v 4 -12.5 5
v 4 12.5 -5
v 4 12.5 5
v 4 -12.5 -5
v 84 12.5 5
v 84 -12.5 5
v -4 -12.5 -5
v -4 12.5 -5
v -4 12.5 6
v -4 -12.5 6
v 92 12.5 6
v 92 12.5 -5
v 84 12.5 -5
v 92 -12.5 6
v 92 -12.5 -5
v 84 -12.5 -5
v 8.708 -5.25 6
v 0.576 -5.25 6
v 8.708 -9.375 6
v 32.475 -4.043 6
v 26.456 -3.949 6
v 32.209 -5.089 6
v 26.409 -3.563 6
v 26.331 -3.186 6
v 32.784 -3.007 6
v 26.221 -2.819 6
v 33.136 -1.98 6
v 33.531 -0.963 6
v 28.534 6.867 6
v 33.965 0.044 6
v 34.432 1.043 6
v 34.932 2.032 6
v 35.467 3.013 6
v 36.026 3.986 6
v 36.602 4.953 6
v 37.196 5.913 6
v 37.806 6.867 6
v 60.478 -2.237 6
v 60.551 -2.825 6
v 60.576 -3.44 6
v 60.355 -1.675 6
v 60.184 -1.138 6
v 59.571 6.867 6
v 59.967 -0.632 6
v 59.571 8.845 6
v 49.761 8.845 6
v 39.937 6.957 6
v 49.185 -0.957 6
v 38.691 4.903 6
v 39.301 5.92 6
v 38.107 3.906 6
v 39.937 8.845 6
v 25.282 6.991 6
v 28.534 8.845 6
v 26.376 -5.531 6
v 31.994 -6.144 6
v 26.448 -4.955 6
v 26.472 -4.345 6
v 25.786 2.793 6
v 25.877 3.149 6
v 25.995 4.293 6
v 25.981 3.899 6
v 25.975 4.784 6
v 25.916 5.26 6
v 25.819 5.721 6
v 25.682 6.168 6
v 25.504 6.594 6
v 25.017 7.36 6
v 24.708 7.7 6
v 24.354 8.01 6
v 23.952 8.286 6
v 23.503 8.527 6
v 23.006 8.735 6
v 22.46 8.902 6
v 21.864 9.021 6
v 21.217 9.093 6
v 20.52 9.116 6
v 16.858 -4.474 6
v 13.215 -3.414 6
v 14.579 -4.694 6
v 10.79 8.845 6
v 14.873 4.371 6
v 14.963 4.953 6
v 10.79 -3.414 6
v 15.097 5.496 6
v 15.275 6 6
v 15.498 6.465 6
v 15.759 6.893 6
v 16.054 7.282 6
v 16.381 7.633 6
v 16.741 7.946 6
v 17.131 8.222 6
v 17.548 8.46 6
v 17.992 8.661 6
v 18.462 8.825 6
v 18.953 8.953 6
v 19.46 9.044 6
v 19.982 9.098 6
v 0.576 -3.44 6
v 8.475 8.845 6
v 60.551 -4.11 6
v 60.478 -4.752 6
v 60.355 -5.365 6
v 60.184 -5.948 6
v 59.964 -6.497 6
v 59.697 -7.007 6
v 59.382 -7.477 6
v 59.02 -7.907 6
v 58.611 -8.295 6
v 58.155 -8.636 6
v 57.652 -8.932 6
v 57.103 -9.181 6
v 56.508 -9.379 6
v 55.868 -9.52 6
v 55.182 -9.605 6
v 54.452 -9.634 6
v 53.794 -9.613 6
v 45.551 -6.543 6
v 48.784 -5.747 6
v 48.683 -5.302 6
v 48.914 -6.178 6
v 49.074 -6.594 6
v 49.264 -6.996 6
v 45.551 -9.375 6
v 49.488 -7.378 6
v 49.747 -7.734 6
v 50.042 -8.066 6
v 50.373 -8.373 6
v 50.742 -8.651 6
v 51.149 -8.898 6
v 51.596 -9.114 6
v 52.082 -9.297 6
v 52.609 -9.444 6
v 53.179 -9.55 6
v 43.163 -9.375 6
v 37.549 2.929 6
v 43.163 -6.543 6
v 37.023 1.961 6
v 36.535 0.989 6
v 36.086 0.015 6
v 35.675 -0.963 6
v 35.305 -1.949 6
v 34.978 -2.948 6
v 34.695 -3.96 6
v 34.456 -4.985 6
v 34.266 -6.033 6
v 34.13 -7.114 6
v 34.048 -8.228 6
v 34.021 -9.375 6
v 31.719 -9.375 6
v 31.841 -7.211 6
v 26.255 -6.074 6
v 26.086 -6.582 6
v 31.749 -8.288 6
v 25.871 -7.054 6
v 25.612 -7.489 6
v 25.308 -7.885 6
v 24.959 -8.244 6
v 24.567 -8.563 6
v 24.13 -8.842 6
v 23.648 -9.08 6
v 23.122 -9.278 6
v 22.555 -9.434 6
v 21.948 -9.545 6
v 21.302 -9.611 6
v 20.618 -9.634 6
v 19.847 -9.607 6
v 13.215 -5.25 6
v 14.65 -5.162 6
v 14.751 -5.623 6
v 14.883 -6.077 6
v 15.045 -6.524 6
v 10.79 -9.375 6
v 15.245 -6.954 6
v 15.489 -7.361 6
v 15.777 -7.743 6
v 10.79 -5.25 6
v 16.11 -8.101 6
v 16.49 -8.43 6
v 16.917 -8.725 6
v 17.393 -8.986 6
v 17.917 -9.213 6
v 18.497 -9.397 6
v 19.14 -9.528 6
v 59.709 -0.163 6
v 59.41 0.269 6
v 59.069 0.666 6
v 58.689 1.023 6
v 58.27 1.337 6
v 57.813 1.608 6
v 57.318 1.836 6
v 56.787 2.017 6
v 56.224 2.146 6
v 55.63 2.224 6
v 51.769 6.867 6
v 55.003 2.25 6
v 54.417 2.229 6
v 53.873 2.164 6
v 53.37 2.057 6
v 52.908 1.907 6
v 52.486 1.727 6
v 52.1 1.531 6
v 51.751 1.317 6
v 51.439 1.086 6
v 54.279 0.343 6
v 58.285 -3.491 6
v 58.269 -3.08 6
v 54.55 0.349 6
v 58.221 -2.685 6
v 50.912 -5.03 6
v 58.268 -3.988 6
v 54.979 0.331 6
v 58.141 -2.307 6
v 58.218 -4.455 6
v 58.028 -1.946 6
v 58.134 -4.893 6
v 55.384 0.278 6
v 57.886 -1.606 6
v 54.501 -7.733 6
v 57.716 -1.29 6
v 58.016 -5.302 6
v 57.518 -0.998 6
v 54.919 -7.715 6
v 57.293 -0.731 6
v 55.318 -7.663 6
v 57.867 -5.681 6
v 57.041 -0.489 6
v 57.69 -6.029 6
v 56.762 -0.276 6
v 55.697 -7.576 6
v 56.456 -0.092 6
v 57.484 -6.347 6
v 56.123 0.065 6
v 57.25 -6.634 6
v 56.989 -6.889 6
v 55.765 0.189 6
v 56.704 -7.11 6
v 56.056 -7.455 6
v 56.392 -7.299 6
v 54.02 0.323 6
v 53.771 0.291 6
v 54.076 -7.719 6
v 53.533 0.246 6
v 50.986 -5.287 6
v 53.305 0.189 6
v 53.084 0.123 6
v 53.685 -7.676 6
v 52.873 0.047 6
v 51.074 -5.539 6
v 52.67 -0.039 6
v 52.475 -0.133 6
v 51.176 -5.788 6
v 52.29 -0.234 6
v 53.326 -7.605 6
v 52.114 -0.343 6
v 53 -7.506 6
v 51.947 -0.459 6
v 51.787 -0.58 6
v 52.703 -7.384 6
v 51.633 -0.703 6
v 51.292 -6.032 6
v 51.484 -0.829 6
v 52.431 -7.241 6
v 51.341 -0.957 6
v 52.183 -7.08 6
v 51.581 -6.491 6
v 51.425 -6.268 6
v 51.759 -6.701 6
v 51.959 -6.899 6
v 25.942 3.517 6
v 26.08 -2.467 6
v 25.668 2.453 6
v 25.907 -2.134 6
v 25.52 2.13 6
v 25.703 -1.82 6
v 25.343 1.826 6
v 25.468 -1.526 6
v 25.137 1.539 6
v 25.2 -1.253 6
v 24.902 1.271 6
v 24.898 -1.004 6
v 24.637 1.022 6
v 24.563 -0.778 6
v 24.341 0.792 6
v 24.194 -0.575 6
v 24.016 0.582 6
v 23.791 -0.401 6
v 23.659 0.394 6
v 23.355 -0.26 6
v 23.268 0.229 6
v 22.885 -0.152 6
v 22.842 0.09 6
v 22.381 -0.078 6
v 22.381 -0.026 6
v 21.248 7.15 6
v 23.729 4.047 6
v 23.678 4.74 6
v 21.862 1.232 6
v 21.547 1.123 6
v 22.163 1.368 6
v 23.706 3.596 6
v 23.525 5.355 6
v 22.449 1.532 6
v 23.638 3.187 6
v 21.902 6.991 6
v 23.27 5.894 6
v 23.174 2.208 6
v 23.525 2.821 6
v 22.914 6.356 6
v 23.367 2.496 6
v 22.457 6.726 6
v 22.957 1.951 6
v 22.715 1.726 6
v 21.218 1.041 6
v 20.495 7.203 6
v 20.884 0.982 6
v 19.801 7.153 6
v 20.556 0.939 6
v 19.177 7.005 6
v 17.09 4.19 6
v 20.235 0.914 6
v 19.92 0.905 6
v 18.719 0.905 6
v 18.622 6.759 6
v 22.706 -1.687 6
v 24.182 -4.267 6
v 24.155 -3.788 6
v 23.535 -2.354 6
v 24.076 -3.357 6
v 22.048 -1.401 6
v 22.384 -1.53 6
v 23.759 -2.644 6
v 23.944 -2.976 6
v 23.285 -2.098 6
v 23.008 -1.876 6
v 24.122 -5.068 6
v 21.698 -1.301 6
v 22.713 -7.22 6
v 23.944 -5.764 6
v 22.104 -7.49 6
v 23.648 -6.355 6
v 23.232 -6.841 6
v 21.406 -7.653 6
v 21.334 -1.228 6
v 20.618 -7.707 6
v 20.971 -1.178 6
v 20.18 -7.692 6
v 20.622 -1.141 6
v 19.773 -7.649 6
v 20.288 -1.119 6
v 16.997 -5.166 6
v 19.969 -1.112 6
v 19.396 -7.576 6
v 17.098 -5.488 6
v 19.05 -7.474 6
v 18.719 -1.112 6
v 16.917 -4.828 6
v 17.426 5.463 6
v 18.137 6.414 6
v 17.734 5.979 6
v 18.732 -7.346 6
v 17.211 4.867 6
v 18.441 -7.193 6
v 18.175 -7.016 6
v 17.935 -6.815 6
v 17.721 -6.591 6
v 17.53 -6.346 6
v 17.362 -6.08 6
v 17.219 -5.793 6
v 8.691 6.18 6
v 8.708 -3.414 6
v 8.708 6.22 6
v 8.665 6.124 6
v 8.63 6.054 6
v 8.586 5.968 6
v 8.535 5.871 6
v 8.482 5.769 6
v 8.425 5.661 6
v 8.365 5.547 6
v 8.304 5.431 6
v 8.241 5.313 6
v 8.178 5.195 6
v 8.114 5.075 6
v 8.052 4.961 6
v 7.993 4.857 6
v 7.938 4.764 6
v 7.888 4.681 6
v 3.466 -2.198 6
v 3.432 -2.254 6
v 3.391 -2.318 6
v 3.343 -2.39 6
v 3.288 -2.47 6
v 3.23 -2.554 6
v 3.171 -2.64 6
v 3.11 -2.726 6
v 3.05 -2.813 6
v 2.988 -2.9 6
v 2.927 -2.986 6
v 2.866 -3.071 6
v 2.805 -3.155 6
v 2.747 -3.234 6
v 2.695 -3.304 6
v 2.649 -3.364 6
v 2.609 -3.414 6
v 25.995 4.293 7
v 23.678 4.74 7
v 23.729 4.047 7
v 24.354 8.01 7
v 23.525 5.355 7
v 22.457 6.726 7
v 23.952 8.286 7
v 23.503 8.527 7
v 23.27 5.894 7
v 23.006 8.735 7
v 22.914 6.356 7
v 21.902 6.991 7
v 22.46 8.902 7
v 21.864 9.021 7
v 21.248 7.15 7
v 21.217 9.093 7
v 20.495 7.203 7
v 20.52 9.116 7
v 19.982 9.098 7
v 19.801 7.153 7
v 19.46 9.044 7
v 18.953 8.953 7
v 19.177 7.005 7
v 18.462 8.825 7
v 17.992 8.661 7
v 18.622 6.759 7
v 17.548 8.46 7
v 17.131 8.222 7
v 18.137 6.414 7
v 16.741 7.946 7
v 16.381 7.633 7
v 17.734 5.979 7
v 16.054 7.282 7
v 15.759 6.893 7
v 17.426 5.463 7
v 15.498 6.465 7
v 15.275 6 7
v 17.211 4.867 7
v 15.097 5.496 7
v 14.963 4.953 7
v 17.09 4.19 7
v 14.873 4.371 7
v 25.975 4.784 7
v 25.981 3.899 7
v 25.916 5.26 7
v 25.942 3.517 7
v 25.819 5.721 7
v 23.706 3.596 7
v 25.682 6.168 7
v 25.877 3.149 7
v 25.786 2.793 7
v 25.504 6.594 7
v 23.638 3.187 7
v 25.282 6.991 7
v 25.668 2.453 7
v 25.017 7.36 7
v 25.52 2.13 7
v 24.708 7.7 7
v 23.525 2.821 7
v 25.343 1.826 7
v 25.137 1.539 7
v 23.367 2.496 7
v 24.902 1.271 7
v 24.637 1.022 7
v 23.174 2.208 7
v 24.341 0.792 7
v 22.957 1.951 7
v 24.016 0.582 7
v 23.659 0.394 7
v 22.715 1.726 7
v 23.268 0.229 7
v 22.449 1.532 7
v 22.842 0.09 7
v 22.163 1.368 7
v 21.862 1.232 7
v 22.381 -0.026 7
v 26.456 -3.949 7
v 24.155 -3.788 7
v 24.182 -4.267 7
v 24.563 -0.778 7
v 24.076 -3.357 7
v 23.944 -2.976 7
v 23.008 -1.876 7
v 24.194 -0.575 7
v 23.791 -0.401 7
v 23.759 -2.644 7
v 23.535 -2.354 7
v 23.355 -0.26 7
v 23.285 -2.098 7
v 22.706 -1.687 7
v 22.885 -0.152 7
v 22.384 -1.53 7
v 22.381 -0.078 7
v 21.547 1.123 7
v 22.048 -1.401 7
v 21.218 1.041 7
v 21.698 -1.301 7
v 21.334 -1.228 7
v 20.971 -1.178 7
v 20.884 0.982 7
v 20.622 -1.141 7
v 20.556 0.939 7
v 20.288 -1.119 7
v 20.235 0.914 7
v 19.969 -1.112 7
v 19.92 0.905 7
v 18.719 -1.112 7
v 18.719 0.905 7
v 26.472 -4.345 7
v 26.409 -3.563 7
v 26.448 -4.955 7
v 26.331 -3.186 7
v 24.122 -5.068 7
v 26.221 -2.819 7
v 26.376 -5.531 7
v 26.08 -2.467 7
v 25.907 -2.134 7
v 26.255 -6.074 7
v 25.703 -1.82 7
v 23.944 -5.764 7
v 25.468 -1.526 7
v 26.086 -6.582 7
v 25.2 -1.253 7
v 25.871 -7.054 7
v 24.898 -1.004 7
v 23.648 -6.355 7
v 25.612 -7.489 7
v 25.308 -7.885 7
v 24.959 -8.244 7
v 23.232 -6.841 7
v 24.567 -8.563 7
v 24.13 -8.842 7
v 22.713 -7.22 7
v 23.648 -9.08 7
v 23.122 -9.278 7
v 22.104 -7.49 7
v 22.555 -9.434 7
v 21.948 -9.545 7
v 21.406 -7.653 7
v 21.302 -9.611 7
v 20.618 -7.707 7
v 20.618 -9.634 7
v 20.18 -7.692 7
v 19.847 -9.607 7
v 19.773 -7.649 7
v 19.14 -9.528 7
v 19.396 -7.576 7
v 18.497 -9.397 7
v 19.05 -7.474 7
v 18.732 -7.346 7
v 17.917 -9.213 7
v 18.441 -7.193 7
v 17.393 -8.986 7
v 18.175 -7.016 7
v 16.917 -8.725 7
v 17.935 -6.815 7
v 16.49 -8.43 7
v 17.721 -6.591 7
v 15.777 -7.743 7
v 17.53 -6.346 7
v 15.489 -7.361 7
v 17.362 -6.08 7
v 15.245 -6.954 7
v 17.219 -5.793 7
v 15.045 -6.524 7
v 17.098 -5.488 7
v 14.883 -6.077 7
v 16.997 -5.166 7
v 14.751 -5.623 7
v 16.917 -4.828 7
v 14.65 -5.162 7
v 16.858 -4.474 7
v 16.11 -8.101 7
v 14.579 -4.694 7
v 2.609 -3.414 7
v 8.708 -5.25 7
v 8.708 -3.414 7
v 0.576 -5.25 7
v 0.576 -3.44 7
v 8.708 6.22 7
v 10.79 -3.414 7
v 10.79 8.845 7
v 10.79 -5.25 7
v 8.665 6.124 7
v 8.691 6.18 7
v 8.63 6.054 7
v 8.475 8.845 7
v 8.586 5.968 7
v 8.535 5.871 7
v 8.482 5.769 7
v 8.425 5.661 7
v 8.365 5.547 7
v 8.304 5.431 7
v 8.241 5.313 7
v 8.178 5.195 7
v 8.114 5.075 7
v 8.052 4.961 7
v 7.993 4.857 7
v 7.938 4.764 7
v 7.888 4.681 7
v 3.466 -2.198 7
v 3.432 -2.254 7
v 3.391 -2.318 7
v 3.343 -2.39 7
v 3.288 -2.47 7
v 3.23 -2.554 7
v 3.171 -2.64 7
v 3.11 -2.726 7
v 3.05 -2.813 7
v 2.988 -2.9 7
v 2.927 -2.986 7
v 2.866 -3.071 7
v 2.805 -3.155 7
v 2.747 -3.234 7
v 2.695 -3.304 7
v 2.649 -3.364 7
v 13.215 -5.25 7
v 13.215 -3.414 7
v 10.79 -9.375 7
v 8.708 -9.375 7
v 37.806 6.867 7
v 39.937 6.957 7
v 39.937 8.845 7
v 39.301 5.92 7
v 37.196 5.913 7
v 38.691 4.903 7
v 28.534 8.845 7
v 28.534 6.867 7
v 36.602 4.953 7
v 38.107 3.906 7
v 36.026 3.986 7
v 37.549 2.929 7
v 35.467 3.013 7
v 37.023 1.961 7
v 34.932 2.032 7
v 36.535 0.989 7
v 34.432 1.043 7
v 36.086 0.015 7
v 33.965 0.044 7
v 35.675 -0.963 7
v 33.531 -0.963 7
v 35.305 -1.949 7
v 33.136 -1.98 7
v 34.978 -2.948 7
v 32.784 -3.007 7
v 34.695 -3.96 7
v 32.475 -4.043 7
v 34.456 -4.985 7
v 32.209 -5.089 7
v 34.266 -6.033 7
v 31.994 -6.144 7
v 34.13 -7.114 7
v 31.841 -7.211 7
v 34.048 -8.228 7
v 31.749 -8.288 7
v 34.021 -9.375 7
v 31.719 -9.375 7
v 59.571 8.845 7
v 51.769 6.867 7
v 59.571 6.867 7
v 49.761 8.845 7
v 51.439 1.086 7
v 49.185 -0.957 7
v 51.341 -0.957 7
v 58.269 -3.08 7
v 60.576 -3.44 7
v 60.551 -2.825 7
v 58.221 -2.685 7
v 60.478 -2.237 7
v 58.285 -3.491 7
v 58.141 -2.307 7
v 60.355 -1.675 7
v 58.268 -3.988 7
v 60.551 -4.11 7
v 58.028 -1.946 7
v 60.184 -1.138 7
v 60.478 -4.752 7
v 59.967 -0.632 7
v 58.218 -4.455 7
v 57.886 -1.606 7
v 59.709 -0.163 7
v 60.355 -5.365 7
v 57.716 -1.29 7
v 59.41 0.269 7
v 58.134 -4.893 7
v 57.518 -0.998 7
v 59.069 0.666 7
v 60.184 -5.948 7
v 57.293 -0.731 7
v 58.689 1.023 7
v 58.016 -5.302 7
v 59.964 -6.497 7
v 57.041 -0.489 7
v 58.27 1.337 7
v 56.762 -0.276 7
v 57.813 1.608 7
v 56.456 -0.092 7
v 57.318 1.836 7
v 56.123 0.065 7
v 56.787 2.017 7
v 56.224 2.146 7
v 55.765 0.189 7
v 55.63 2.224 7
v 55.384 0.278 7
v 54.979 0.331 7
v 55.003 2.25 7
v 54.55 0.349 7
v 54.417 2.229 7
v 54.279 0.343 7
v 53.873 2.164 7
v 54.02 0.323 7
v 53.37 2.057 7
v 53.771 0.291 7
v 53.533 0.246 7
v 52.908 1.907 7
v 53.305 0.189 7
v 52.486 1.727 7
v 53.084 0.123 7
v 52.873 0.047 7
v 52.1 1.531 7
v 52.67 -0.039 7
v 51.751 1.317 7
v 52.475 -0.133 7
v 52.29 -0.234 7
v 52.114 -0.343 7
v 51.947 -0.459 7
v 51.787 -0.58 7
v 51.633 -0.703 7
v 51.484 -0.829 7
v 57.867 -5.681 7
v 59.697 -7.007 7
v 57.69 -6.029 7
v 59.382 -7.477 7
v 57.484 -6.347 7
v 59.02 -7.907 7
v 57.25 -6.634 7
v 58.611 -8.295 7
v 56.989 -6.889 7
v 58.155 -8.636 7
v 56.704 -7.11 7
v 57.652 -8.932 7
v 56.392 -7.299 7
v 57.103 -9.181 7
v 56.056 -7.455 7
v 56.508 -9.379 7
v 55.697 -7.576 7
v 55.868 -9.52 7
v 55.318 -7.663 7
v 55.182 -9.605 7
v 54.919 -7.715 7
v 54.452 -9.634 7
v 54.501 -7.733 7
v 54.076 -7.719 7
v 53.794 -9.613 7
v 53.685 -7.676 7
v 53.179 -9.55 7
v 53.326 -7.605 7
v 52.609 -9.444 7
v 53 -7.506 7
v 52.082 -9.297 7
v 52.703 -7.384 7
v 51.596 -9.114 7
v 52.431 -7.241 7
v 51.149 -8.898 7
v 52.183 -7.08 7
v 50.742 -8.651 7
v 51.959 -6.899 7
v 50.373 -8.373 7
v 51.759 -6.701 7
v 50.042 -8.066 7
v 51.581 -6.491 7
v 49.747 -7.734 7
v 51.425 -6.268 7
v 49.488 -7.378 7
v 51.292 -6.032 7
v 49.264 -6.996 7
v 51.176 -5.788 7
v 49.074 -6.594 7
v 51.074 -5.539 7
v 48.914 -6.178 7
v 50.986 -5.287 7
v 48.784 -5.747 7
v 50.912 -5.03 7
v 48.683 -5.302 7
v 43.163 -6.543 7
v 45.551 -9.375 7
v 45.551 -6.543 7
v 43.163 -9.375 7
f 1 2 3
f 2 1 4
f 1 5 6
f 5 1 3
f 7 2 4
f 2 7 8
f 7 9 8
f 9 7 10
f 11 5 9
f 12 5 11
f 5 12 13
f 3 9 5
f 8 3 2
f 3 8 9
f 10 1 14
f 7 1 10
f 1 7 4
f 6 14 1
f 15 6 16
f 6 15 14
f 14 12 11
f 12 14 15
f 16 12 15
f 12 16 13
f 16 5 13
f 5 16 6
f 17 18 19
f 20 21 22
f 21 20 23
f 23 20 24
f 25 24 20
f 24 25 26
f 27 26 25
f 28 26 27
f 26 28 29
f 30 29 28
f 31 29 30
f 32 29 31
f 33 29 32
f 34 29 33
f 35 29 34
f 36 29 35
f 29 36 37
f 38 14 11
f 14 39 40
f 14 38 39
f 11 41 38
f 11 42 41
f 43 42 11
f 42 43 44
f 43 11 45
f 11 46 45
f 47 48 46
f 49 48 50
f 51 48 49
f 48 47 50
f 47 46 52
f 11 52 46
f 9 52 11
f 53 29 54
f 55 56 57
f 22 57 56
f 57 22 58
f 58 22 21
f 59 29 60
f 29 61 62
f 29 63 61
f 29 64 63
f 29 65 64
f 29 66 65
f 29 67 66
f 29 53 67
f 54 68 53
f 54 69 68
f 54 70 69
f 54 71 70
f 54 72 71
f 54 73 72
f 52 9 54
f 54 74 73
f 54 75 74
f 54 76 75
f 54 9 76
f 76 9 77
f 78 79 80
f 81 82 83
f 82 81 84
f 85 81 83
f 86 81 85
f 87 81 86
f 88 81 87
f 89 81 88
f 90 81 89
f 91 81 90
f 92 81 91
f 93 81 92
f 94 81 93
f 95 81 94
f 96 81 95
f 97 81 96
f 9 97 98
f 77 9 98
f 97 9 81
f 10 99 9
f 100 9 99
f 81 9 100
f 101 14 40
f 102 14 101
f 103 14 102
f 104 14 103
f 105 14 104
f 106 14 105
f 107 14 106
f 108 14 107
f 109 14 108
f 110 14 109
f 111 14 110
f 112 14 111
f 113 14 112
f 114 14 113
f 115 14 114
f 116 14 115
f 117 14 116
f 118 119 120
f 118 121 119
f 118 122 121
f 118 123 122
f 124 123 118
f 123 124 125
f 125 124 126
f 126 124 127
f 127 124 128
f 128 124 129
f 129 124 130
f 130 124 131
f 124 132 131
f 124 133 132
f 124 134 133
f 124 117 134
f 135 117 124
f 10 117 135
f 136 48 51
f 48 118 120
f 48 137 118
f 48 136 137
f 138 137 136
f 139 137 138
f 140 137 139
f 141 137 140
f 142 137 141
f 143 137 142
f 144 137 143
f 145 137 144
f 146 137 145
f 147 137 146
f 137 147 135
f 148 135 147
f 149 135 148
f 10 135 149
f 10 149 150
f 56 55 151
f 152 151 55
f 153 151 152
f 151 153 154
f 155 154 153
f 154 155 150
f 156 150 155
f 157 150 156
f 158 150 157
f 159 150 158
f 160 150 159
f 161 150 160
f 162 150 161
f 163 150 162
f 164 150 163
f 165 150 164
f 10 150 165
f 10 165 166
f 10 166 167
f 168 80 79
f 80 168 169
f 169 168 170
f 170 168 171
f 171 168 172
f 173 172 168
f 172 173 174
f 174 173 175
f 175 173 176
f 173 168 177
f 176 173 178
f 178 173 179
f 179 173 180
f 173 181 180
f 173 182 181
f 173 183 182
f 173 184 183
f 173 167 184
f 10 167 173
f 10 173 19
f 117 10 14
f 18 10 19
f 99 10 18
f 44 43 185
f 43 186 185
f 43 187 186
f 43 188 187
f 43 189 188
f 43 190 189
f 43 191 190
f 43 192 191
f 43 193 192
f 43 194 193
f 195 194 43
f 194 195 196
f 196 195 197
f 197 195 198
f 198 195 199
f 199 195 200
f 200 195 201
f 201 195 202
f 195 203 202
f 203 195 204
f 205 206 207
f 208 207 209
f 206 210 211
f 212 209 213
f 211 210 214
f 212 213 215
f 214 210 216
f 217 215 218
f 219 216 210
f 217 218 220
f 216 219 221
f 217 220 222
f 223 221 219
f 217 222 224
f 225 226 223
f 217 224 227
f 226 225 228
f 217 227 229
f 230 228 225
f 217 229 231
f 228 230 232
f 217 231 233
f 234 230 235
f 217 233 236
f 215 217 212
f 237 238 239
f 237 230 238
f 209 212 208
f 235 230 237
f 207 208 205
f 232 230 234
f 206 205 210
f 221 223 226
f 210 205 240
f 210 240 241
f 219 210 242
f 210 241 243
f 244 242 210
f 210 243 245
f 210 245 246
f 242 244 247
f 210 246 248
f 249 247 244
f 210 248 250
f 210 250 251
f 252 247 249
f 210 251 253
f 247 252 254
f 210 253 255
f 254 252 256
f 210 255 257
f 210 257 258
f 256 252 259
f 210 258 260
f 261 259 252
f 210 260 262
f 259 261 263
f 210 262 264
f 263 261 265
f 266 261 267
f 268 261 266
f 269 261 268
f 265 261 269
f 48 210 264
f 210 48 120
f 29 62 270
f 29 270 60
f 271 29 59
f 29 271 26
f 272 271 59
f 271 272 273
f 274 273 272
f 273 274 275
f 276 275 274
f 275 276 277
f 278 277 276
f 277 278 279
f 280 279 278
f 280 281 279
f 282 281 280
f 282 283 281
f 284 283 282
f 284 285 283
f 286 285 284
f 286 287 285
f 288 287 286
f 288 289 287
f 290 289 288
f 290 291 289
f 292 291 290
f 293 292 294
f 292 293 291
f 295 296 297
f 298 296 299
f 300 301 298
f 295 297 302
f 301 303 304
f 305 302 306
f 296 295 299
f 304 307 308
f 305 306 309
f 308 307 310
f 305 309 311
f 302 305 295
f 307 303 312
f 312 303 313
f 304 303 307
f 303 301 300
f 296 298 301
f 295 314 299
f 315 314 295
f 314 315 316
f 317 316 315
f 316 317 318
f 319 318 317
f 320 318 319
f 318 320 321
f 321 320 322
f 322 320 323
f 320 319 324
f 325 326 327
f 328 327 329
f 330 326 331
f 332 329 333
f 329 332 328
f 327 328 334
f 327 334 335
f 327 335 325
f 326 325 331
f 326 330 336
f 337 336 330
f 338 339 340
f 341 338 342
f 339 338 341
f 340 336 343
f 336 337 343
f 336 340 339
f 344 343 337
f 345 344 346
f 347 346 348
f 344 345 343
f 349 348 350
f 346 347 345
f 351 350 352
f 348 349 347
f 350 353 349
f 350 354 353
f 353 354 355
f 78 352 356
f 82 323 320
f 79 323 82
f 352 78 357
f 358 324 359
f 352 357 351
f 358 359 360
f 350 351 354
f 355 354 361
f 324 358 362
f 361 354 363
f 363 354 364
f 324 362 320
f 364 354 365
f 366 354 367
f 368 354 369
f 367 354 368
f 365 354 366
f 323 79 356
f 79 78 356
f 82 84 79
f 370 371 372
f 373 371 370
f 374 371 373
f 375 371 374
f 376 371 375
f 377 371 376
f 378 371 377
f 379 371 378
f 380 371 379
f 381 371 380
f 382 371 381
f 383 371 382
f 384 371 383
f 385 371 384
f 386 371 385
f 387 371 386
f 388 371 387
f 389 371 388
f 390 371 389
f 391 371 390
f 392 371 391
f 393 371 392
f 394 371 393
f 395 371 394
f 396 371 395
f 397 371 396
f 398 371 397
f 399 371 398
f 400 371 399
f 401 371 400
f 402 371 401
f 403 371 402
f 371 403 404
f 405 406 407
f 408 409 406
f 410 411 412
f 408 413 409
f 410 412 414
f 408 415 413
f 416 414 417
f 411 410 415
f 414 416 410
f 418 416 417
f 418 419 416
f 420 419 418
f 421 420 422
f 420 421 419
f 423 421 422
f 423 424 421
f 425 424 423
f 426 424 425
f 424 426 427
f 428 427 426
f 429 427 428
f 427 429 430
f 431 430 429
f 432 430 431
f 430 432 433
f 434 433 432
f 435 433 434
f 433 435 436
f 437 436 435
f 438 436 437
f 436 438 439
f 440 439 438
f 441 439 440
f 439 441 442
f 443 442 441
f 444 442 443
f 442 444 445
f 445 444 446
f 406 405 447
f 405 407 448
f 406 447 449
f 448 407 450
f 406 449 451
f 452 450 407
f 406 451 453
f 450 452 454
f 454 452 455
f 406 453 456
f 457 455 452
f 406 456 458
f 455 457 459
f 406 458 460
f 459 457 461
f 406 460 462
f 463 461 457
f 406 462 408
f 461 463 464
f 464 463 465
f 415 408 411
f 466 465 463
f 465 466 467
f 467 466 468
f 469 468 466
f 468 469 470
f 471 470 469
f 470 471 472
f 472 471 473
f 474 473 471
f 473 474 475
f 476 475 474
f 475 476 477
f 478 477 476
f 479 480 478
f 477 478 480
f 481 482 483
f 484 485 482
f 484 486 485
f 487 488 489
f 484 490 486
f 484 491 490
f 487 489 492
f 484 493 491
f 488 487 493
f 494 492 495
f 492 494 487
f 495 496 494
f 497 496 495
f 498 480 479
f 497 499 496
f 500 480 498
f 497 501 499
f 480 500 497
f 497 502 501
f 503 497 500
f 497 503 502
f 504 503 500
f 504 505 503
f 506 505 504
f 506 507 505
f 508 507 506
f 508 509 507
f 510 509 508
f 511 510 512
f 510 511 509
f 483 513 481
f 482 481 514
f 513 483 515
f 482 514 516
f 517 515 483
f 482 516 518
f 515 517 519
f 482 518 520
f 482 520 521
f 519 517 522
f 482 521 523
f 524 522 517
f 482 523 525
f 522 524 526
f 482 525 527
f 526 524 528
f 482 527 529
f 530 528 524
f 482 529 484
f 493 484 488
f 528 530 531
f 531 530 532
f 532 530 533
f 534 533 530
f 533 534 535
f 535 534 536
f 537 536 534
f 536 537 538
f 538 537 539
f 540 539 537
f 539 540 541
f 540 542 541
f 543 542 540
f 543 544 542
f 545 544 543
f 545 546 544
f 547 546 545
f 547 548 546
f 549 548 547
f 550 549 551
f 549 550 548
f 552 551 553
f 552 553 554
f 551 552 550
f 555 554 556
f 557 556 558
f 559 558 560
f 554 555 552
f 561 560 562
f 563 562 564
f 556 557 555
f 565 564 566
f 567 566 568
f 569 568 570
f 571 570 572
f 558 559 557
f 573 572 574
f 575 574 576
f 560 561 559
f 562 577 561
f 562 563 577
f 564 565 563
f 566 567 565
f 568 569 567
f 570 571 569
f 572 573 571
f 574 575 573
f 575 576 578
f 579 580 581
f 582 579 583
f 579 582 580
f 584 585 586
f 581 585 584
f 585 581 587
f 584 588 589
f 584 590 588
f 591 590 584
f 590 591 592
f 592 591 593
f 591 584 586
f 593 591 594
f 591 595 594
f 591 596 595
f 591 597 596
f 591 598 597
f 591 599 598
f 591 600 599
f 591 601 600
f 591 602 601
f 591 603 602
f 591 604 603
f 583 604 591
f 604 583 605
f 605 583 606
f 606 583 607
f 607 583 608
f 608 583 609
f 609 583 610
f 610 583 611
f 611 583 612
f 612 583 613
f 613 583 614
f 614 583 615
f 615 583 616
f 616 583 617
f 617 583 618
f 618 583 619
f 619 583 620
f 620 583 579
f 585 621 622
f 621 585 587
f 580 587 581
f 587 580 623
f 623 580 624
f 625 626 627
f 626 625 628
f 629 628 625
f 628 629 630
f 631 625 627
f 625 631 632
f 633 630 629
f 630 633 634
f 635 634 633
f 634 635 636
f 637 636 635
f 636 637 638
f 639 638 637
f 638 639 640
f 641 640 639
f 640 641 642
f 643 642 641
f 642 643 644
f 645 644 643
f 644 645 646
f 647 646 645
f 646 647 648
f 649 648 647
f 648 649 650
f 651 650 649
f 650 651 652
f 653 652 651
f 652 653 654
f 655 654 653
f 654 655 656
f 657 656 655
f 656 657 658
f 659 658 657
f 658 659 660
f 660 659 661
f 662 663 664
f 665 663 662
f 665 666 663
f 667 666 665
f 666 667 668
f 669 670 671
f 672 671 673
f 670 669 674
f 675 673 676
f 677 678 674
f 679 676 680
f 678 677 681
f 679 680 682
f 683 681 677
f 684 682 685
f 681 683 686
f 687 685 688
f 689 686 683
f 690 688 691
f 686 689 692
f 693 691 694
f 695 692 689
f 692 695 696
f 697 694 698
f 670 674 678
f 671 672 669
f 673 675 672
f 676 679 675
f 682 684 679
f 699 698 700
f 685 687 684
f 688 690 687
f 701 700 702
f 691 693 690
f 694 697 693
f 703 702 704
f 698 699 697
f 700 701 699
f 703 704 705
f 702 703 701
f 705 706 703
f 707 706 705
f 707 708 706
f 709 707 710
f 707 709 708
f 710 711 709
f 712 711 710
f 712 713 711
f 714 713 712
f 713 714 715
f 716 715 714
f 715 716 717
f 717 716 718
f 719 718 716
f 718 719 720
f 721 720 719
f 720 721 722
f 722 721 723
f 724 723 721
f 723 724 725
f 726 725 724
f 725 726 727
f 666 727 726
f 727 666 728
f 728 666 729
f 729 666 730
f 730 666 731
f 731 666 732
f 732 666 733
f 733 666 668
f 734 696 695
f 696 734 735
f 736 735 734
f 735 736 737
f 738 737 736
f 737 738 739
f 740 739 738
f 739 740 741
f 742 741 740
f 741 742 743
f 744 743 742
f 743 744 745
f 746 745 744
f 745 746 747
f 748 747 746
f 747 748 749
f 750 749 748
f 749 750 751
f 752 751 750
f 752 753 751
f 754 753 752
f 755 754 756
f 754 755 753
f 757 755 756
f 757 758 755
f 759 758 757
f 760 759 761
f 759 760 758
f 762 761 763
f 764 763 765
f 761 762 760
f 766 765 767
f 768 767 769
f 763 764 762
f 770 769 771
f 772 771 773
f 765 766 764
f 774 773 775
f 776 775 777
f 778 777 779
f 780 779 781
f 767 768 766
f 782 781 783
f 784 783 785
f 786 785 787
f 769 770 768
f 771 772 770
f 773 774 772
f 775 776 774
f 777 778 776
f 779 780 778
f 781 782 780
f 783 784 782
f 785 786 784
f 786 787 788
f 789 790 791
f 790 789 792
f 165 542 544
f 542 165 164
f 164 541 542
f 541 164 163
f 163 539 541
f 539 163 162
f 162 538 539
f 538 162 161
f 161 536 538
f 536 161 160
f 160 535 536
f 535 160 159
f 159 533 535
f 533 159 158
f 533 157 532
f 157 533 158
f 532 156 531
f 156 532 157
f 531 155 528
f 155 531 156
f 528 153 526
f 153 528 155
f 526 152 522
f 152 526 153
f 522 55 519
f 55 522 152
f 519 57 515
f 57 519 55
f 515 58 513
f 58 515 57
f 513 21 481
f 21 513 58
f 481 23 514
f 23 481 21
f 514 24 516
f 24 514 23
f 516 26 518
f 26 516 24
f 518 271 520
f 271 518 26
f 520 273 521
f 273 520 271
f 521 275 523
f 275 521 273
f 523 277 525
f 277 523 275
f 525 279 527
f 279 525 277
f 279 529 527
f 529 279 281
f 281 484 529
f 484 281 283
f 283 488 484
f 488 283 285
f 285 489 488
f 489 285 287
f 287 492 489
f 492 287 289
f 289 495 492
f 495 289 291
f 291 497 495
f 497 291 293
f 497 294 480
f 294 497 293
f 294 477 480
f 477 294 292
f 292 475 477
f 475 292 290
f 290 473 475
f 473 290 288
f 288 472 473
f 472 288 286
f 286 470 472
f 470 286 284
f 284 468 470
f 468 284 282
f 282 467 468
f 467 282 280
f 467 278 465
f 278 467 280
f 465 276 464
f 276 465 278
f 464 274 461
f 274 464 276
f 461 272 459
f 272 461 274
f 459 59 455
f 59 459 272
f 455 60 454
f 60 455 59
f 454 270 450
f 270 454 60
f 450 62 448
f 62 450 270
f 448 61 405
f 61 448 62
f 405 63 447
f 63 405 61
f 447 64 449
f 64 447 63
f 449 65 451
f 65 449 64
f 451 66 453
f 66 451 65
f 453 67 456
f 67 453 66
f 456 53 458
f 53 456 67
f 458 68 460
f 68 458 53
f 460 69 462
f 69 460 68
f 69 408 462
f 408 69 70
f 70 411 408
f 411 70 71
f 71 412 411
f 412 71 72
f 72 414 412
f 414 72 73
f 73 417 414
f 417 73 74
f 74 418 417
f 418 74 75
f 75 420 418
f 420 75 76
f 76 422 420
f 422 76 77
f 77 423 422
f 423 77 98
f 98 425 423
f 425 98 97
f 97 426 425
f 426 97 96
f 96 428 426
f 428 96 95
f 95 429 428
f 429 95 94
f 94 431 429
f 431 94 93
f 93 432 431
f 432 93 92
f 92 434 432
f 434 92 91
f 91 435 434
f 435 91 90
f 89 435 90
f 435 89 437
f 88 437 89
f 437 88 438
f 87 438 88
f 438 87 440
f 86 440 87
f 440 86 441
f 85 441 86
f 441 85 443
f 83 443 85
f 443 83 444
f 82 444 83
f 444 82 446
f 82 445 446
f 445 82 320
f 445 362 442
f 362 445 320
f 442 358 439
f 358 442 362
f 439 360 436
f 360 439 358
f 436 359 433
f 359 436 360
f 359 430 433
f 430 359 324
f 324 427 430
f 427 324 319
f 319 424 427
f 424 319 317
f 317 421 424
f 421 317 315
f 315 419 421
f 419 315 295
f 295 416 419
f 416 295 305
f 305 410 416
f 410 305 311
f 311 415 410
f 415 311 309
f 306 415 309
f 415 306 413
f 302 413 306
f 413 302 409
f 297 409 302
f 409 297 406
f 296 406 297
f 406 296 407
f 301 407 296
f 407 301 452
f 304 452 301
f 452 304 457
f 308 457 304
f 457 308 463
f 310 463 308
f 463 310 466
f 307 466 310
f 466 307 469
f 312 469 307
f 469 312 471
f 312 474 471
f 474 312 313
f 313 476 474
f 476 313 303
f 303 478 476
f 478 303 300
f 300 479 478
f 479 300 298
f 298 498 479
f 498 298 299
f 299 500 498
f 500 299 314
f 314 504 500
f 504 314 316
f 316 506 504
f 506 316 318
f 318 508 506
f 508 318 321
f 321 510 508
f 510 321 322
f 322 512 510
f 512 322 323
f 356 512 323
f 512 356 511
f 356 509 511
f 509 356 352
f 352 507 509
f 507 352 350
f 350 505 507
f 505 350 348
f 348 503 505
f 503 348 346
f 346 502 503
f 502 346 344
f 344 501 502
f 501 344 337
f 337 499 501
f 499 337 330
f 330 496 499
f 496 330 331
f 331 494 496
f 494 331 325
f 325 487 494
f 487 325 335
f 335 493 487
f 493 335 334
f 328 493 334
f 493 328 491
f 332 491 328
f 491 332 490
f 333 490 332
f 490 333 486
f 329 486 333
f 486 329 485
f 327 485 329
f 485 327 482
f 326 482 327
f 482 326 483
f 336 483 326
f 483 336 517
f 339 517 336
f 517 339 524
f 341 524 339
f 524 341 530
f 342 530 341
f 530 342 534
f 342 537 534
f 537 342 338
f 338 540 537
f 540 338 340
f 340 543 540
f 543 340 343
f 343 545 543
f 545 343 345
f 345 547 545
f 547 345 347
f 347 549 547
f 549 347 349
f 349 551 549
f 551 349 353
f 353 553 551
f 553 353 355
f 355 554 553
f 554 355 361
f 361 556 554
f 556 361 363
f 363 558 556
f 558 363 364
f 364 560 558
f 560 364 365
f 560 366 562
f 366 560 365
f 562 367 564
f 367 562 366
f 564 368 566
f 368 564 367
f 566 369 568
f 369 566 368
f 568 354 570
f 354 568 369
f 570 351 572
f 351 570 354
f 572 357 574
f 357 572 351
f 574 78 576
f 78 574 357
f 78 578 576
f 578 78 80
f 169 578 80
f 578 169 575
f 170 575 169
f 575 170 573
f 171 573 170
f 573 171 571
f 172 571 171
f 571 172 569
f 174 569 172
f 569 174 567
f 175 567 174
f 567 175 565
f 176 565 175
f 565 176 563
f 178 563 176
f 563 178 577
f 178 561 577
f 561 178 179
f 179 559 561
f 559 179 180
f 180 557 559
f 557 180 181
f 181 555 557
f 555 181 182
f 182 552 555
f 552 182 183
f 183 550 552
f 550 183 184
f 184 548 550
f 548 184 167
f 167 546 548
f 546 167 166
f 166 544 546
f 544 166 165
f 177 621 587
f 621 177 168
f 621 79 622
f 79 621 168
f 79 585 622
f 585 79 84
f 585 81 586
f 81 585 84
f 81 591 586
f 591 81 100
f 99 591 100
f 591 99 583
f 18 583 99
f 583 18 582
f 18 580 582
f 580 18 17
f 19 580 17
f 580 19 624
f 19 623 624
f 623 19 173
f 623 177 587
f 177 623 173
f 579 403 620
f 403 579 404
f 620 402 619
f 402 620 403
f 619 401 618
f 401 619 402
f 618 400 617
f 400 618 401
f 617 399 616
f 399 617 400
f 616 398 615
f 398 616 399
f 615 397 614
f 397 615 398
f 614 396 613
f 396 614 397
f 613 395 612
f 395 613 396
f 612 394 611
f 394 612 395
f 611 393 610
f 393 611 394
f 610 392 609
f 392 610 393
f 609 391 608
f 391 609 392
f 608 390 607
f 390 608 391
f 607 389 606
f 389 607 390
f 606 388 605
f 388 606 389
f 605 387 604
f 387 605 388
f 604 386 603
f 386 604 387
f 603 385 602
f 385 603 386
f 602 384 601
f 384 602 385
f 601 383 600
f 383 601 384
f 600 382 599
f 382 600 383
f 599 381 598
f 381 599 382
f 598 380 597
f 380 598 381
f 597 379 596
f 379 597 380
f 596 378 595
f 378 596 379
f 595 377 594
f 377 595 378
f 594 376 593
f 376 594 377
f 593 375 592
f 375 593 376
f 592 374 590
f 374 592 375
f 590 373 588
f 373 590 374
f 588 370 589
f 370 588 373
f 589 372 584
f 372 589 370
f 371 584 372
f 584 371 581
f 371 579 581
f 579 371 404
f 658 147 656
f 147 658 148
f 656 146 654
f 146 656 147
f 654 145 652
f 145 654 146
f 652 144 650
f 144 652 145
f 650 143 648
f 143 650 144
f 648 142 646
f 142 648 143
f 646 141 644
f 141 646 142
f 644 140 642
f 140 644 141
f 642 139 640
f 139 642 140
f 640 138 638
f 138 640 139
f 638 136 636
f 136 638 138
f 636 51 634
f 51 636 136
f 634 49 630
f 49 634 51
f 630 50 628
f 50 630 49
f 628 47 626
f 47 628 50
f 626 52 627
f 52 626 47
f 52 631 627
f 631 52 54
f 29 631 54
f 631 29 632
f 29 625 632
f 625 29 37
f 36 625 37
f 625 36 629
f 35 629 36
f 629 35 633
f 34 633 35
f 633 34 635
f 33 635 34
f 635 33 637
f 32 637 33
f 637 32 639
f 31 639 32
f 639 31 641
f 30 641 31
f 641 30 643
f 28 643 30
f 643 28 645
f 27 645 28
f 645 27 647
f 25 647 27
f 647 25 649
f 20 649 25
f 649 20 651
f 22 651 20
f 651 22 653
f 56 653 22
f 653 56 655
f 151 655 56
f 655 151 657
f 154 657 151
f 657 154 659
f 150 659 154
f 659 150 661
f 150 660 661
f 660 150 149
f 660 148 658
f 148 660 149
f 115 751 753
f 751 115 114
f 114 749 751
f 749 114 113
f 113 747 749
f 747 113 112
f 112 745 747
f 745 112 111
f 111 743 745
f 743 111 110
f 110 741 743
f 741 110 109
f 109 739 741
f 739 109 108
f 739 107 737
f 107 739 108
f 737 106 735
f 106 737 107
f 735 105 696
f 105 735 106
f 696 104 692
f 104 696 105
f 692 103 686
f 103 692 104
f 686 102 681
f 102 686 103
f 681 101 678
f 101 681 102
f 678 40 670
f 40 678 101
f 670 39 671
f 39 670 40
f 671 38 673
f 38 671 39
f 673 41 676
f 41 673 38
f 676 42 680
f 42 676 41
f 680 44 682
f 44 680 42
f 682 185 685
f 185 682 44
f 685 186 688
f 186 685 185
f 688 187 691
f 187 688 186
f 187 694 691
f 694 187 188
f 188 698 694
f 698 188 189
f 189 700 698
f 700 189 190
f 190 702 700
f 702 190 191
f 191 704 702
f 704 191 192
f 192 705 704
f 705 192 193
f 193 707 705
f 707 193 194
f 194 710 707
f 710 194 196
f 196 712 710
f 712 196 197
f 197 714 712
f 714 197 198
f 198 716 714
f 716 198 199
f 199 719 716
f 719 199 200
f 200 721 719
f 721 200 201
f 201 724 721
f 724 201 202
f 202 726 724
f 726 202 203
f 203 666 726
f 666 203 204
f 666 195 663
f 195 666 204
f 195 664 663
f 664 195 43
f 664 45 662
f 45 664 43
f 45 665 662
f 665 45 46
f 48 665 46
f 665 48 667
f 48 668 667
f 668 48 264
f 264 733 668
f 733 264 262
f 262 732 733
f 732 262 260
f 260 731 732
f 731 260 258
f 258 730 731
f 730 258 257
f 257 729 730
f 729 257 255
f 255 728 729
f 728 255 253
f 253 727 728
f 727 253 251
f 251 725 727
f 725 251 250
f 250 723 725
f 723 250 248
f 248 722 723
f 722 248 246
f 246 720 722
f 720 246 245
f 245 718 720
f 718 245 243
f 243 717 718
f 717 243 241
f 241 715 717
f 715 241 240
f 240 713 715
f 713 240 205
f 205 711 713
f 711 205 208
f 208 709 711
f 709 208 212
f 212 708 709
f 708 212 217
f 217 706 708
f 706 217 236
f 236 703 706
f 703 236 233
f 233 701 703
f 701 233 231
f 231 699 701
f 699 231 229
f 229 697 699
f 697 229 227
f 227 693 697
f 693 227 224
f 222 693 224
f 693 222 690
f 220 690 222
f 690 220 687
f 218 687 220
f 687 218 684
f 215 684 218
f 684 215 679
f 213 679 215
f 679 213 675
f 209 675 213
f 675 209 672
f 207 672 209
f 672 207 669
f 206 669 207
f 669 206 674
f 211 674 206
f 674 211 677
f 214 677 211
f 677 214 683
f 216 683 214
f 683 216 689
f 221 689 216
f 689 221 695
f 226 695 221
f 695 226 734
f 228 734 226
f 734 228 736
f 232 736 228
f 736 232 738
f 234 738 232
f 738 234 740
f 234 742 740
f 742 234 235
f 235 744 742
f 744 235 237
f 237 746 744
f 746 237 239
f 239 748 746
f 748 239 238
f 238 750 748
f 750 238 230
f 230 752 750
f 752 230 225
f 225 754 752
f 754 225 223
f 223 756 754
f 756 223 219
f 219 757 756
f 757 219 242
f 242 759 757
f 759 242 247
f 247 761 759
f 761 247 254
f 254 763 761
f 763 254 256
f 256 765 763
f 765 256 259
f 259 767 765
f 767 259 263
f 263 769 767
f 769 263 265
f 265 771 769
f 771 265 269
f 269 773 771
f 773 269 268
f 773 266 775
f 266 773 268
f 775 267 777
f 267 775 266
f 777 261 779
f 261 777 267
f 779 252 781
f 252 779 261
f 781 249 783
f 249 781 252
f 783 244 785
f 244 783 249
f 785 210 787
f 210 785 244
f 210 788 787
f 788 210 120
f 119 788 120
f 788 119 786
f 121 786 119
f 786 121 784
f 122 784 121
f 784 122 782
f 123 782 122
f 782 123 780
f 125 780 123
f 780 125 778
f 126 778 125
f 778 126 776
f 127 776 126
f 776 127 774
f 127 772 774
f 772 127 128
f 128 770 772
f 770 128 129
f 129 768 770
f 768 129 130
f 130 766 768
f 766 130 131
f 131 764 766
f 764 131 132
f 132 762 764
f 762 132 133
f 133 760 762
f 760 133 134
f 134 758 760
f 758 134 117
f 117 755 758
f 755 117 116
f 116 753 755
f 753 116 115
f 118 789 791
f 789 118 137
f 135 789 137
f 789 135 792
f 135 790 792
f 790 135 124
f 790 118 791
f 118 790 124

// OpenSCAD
module bridge(
    width = 25,
    length = 80
    ){
    
    //Do not modified these constants
    height = 10;
    base = 8;
    bridge_thick = 1;
    length_score = 5;
    width_score = 1.5;
    magic = 0.75; 
        
    cube([base,width,height],center=true);
    translate([length+base,0,0])cube([base,width,height],center=true);
    color("red") translate([length/2+base/2,0,height/2+bridge_thick/2])cube([length+2*base,width,bridge_thick],center=true);
       
    finalScore = (width * width_score) + (length * length_score);
    echo(str("Congratulation you received " , finalScore , " points"));
        
    mySize = (width > length) ? length : width;
    translate([0,-width/2*magic,height/2+bridge_thick])    resize([length*magic,width*magic,1]) linear_extrude(height = magic)text(str(finalScore), size=mySize/2);
}


bridge();
